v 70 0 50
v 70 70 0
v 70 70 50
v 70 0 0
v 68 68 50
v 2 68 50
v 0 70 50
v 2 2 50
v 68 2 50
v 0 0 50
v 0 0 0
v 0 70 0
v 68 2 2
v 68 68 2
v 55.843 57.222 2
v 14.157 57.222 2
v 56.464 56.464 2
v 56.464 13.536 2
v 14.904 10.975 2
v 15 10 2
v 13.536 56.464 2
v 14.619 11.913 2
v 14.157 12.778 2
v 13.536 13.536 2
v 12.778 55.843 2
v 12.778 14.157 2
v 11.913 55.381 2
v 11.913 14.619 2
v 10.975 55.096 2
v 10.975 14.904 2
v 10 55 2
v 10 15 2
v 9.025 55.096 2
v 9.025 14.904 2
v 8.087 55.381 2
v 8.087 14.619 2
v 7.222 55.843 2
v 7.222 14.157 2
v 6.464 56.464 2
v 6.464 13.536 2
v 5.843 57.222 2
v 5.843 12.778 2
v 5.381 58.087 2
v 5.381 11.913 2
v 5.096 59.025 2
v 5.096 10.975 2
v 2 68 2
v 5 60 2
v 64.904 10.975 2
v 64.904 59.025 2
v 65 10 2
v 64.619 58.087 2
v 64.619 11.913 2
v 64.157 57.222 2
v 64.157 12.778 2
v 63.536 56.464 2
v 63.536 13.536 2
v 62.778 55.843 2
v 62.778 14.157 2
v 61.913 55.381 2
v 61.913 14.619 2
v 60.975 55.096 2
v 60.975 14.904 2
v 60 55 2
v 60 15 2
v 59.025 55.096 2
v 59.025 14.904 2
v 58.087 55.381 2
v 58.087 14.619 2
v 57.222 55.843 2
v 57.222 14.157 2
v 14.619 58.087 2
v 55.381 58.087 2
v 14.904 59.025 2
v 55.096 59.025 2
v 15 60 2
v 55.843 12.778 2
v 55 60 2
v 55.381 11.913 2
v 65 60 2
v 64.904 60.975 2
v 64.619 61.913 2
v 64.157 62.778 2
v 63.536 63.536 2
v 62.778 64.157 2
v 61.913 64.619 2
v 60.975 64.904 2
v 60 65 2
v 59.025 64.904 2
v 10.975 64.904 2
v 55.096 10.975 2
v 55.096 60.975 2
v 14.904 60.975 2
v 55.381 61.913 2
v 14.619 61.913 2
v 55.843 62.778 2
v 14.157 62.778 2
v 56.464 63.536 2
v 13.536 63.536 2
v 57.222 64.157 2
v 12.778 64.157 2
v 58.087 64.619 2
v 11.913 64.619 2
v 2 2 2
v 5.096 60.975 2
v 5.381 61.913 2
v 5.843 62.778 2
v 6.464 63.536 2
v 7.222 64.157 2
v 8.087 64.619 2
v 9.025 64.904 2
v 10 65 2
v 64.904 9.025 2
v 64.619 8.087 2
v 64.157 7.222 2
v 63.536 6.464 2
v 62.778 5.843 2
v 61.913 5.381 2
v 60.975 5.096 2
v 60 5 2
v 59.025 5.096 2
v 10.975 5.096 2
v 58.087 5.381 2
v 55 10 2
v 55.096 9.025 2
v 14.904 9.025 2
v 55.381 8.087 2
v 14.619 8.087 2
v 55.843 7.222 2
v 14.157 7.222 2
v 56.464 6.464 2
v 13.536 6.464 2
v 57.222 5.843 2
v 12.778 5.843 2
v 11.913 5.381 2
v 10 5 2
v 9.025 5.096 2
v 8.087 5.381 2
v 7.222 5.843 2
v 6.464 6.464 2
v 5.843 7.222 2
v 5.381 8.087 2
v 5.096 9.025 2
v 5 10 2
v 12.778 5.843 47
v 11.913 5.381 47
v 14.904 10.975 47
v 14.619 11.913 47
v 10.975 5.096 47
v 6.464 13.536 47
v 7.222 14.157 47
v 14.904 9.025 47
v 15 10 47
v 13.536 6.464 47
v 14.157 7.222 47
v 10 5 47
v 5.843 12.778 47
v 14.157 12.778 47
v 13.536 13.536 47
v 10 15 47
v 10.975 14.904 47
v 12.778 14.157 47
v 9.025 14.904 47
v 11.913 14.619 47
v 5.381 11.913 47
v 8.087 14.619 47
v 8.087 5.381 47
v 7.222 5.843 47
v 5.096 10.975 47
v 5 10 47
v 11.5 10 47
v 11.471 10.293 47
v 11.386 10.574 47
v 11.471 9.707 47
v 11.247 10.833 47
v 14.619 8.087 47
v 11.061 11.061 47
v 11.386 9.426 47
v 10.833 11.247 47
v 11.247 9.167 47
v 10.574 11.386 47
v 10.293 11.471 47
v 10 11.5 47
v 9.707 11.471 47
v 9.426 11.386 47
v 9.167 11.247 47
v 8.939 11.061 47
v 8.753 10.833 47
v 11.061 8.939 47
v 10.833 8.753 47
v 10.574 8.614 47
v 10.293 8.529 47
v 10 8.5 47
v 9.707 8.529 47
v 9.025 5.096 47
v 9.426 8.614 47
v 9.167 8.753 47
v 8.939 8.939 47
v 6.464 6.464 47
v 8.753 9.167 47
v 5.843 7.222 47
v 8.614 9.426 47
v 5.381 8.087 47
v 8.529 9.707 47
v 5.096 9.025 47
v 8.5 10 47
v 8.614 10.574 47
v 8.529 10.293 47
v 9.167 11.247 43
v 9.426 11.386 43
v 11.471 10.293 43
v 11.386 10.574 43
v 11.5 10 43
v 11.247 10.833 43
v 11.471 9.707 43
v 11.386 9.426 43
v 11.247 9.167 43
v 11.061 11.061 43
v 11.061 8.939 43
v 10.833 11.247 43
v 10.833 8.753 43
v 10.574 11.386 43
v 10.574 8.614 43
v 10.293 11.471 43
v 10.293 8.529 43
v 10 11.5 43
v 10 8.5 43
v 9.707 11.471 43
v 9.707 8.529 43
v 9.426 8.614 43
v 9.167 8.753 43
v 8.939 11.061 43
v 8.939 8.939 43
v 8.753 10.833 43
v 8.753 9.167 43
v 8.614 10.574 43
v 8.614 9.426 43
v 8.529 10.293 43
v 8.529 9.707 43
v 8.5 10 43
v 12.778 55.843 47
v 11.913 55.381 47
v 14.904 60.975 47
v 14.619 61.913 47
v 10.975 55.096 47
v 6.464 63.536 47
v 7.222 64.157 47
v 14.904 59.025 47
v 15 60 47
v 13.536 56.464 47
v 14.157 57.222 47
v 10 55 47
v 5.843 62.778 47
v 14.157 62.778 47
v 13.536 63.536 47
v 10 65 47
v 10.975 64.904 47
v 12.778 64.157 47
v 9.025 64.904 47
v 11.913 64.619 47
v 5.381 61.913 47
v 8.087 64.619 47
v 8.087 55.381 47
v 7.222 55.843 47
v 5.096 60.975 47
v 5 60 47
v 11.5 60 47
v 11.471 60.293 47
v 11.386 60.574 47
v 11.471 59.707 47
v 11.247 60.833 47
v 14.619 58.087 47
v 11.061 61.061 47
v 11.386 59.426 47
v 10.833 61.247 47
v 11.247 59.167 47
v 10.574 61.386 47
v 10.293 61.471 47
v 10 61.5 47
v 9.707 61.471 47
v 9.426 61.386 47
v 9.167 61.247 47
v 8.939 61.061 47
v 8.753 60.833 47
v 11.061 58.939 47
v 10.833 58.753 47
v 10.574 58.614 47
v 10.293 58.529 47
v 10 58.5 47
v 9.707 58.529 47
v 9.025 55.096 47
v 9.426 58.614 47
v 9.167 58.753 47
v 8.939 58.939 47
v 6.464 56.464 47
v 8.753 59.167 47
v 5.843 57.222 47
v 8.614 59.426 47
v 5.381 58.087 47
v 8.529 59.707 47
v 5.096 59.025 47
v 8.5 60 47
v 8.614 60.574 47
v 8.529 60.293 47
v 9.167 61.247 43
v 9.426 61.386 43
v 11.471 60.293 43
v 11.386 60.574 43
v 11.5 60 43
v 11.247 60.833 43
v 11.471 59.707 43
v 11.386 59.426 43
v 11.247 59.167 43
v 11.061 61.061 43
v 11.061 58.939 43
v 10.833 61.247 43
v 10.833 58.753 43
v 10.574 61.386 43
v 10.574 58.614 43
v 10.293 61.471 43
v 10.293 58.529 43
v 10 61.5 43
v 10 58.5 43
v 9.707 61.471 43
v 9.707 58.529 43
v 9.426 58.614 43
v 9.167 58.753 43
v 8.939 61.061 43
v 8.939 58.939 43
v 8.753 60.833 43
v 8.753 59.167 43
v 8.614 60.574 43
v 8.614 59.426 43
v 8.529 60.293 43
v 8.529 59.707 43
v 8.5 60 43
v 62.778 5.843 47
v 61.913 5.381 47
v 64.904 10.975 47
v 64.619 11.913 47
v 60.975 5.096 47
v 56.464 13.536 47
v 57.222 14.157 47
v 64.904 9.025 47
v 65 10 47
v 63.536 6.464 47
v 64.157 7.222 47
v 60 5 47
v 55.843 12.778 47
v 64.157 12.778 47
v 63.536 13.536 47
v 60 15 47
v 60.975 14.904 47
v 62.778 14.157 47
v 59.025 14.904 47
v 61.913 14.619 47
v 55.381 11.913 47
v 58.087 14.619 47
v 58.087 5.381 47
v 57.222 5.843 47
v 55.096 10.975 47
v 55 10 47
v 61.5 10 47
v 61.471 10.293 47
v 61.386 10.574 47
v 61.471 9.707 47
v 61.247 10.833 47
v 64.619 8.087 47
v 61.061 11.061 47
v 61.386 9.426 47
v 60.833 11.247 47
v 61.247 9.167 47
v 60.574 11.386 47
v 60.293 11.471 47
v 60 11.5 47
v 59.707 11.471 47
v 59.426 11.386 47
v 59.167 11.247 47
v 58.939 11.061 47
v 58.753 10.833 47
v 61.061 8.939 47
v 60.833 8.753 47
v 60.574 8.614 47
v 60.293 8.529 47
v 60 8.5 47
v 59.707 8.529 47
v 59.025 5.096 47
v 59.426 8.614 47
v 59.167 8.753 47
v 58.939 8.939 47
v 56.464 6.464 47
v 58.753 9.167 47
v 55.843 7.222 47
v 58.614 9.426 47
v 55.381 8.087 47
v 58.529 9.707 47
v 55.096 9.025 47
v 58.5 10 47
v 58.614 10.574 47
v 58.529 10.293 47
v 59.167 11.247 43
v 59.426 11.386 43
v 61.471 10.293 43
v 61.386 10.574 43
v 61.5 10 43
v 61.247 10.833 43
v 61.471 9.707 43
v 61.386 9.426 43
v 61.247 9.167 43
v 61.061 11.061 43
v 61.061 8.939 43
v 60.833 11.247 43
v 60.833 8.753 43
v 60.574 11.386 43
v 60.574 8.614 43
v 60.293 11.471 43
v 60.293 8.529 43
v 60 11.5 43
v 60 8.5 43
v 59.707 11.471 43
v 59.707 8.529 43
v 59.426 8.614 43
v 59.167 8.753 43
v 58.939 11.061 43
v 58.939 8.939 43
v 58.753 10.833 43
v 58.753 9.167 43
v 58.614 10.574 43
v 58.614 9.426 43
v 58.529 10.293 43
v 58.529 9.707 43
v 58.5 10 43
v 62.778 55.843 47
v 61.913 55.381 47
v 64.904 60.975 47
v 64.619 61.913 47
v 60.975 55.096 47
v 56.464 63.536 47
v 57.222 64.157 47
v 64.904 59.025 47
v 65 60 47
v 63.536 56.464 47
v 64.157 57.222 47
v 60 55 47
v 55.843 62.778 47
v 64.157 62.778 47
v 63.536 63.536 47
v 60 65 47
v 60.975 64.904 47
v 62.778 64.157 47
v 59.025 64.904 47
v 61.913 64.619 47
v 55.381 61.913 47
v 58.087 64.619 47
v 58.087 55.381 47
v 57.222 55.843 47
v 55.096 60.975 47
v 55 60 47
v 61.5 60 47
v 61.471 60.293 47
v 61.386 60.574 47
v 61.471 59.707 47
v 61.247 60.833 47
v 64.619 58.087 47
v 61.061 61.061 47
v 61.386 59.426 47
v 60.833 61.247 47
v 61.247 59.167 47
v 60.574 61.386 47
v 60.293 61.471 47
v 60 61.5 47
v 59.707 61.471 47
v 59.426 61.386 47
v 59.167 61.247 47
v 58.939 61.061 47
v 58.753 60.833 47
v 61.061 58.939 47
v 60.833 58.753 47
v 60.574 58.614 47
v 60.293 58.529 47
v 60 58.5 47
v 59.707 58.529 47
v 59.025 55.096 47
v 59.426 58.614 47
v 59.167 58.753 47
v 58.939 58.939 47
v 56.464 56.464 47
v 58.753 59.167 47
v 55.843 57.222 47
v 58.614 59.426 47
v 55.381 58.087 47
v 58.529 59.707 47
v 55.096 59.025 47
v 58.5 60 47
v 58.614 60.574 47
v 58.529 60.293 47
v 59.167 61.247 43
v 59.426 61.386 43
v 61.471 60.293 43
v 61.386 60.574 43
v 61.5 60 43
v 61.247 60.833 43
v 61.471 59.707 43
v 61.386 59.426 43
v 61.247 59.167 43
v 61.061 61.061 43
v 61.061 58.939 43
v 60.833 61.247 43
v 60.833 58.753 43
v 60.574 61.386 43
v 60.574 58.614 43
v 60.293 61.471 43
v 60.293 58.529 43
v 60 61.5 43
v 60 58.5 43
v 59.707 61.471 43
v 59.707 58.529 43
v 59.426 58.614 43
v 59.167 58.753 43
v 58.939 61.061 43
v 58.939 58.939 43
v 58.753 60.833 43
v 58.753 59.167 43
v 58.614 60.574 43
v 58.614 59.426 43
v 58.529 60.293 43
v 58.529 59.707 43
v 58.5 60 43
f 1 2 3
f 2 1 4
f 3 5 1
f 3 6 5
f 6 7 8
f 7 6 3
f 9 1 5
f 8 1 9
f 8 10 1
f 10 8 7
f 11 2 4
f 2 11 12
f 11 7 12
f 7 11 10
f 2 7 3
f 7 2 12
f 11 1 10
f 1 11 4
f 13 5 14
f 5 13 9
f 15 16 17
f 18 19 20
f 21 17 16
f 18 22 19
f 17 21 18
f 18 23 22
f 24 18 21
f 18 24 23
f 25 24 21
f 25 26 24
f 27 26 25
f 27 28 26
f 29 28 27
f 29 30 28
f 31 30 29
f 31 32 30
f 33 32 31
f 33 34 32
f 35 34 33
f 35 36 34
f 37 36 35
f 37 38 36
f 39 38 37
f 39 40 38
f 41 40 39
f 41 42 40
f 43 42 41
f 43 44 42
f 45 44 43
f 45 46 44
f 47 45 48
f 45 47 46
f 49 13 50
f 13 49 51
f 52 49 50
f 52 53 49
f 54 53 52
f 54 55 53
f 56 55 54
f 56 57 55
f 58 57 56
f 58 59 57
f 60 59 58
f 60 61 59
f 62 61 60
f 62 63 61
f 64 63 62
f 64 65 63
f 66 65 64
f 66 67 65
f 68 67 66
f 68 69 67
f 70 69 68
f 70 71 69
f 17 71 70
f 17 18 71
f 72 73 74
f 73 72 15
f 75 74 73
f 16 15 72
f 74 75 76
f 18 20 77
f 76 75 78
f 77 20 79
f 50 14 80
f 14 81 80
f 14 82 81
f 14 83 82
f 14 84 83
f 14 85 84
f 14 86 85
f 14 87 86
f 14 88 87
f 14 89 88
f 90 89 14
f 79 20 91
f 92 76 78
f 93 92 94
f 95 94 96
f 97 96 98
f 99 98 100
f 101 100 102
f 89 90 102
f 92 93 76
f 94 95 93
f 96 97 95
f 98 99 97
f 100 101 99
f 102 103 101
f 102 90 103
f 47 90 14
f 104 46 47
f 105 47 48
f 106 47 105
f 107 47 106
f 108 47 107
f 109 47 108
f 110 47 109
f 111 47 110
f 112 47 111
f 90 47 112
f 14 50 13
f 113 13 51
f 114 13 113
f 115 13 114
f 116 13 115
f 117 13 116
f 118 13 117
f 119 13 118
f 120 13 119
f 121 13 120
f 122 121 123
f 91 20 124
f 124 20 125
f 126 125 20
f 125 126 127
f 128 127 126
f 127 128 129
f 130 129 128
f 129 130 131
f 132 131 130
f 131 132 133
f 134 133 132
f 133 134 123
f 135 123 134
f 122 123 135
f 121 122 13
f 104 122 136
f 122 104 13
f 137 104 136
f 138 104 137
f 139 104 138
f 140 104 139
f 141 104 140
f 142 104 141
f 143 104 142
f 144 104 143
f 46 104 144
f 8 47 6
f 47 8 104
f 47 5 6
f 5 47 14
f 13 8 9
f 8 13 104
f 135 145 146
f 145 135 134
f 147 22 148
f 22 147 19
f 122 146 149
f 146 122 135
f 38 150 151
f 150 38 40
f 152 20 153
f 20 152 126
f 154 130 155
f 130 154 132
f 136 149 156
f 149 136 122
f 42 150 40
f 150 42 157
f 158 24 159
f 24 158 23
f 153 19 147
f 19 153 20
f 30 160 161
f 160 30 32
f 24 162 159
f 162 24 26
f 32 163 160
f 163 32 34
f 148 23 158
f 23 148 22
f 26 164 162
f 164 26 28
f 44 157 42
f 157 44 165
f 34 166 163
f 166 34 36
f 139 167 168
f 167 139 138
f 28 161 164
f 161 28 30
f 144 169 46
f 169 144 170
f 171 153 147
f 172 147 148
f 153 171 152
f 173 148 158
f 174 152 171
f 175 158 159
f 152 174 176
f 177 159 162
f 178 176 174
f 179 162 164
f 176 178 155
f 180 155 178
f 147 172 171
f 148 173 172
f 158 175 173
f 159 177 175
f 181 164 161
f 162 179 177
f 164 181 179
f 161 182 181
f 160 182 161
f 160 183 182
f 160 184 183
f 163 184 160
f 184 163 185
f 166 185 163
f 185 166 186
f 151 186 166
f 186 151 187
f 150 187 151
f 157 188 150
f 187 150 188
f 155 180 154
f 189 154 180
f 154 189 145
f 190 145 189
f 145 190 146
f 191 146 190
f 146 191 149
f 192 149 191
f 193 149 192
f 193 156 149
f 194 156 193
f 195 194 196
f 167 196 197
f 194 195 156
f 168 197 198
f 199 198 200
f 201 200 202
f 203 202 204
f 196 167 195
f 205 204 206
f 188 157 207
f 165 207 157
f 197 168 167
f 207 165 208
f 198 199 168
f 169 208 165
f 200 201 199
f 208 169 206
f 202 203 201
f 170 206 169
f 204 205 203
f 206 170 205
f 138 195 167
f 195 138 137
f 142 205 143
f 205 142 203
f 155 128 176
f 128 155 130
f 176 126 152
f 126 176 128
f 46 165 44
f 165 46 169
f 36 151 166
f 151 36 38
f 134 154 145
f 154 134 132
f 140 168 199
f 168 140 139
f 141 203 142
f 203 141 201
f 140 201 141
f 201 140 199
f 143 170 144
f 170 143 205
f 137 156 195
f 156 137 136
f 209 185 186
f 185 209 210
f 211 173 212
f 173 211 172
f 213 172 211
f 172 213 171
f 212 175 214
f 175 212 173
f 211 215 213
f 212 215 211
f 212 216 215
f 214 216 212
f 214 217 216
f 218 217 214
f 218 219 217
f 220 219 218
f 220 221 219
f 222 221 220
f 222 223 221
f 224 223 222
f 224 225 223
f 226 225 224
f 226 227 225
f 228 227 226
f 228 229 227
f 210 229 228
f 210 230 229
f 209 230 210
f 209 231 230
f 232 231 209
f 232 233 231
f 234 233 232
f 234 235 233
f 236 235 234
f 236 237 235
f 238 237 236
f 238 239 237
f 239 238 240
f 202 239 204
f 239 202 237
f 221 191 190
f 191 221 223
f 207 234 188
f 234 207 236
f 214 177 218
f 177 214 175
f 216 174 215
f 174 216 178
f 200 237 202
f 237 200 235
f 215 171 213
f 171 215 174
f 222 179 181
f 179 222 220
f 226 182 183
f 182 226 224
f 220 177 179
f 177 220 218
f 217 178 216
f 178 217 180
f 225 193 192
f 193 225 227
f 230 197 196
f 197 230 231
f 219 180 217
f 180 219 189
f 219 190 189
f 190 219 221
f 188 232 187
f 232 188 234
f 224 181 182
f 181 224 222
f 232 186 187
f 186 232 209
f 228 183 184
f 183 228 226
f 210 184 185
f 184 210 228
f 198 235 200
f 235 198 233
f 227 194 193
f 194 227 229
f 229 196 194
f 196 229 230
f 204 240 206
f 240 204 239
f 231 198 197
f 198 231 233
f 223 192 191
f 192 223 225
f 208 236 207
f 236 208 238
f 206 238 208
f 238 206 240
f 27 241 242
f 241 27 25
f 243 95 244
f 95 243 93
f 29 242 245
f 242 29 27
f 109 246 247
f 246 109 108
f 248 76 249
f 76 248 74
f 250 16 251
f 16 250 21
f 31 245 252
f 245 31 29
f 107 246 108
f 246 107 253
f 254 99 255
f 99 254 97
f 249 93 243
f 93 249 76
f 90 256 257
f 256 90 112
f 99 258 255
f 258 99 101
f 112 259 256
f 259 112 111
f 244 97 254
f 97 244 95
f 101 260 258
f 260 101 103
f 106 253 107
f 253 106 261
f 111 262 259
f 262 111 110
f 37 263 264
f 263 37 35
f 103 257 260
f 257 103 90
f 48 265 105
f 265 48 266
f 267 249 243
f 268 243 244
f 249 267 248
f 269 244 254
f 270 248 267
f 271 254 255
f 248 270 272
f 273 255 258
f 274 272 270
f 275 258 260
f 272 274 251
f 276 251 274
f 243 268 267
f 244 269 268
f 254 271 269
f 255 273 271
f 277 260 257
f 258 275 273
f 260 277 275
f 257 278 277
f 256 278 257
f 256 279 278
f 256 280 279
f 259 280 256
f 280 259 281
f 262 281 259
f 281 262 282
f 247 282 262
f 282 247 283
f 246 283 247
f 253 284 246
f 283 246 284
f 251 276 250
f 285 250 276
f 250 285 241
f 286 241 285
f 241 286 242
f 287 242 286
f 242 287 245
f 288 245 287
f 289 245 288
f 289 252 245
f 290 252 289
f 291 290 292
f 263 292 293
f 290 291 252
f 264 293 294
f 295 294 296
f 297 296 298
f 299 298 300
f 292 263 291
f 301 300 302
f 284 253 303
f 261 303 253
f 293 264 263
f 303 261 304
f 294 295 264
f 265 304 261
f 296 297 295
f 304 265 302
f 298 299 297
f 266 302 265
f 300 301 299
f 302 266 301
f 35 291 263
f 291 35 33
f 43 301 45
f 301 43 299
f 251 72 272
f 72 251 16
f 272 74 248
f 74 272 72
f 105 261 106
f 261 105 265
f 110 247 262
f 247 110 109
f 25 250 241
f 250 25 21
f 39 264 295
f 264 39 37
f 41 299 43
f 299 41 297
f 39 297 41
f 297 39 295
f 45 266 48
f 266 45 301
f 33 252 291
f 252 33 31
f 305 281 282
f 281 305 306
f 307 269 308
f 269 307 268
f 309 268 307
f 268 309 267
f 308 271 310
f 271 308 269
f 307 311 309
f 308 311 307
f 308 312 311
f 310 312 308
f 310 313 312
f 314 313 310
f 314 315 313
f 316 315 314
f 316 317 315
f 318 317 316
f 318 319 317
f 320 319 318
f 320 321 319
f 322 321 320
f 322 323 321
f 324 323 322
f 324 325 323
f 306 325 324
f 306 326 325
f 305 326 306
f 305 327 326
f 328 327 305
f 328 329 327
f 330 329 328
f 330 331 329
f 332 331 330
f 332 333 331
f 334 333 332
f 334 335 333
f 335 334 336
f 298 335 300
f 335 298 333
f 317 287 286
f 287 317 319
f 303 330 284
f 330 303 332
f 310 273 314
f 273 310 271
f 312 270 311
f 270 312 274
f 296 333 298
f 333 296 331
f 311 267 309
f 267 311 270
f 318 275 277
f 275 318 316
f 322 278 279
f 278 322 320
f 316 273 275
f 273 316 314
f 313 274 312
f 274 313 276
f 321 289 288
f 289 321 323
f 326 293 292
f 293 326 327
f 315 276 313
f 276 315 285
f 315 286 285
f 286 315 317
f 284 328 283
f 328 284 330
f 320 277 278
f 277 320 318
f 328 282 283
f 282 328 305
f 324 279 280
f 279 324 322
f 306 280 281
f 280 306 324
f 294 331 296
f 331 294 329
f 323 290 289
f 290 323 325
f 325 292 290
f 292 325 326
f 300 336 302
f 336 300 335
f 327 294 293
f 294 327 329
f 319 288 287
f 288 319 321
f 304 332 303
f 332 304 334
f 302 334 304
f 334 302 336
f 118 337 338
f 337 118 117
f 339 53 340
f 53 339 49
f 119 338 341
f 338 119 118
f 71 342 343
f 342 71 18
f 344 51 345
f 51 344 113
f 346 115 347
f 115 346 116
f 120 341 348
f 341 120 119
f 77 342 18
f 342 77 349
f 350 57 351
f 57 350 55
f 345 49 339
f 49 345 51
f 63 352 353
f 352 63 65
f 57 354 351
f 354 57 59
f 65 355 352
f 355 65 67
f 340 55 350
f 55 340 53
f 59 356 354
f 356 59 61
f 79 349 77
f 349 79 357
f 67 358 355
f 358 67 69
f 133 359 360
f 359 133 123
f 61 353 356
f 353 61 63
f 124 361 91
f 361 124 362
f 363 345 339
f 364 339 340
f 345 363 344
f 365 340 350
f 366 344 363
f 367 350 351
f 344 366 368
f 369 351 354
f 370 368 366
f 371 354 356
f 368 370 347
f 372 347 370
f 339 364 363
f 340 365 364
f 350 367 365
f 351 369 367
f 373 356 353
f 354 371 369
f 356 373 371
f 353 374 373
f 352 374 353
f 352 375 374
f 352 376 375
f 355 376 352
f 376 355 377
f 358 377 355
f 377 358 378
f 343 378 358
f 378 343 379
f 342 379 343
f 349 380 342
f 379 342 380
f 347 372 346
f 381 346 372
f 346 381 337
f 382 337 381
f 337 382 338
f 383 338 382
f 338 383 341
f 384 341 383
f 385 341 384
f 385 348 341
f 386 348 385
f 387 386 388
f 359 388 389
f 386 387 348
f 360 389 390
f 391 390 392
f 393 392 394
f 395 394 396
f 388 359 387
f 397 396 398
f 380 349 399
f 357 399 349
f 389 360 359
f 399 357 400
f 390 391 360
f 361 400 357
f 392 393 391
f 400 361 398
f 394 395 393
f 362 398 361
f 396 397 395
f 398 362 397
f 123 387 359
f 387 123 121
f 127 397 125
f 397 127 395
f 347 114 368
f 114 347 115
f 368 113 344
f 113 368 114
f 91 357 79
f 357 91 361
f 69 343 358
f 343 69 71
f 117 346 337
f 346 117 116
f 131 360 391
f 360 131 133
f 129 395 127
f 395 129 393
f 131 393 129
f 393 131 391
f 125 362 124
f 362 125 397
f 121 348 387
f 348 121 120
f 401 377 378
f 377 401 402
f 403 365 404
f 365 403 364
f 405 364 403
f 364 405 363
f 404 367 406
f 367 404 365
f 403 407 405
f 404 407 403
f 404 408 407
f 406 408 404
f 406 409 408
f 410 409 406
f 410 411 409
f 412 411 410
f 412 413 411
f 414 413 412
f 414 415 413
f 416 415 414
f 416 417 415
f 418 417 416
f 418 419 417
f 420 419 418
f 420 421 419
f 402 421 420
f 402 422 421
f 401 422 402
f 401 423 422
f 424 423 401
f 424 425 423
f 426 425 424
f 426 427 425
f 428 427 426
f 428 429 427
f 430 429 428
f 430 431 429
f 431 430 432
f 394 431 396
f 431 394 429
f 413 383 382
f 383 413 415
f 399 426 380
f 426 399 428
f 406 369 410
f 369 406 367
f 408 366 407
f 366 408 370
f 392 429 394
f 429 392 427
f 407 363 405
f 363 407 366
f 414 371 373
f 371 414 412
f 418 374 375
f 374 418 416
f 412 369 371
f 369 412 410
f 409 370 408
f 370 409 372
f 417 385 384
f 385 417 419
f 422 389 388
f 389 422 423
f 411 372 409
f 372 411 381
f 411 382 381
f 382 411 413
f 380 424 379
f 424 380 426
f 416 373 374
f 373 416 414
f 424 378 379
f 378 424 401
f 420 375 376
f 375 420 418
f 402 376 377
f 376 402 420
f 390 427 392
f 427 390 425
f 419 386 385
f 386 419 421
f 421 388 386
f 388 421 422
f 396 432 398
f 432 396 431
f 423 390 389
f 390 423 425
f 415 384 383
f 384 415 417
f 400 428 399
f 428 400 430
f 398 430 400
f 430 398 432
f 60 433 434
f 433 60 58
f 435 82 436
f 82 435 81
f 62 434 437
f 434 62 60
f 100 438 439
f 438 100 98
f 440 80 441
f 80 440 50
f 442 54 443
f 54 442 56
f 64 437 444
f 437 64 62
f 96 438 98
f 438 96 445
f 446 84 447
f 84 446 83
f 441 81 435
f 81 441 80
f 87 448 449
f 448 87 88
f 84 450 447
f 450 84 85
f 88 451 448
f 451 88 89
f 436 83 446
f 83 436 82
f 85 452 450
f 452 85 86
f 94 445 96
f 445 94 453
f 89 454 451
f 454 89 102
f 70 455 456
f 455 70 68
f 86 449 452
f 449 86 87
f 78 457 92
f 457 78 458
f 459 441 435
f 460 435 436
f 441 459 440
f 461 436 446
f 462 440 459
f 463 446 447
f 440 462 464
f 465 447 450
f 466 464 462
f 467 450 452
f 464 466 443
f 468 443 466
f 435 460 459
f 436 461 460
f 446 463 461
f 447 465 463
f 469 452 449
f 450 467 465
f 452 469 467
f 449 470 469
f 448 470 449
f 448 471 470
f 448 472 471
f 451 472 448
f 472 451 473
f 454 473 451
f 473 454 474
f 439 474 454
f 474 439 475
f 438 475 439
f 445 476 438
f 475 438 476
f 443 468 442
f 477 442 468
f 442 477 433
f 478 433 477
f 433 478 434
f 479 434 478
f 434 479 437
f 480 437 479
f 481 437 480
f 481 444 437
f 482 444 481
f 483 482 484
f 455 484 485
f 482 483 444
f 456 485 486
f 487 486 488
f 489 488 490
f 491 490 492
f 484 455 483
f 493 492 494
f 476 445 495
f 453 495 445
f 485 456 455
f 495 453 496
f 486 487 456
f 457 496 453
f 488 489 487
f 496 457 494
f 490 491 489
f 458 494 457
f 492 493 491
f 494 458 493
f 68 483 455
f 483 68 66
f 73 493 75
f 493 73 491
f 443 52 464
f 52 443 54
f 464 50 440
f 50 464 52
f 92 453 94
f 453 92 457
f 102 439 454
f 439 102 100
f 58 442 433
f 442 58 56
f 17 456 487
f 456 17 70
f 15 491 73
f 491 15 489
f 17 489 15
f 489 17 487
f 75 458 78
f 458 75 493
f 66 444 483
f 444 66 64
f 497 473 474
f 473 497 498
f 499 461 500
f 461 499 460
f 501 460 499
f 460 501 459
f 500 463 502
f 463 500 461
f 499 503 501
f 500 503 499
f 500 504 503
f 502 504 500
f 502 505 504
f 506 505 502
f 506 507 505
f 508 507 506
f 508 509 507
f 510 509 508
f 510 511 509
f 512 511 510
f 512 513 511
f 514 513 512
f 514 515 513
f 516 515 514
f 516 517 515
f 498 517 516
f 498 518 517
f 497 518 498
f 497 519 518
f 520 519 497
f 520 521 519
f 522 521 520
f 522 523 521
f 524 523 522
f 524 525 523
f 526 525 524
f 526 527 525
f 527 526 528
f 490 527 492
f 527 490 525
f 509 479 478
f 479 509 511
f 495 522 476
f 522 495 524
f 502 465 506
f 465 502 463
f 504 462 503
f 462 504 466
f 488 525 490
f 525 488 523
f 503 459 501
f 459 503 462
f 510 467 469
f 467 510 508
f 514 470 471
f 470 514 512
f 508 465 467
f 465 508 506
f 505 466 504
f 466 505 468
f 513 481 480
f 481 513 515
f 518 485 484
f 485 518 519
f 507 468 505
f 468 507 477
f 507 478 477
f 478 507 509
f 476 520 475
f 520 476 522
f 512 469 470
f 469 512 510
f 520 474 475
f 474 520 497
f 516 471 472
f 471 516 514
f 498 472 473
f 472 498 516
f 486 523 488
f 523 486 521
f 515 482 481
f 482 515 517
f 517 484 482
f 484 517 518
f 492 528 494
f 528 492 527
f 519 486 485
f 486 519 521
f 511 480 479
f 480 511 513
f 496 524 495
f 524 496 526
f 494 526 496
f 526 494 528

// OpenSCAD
$fn = 32;

// ----------------------------------------------------------------------
// Enclosure box: bosses enclosure
// ----------------------------------------------------------------------

// --- parameters (mm) ---
box_l = 70;               // outer length, X
box_w = 70;               // outer width, Y
box_h = 50;               // outer height
wall_t = 2;               // wall thickness
boss_r = 5;               // corner boss radius
hole_r = 1.5;             // boss screw hole radius
boss_in = 10;             // boss inset from the corners
fit_tol = 0.1;            // tolerance for press fits, mm
free_tol = 0.5;           // tolerance for clearance fits, mm

inner_h = box_h - wall_t;  // cavity depth
boss_h = inner_h - 2;  // corner boss height

difference() {
  union() {
    difference() {
      cube([box_l, box_w, box_h]);
      translate([wall_t, wall_t, wall_t])
        cube([box_l - 2 * wall_t, box_w - 2 * wall_t, box_h]);
    }
    for (sx = [0, 1], sy = [0, 1])
      translate([sx ? box_l - boss_in : boss_in,
                 sy ? box_w - boss_in : boss_in, wall_t - 1])
        difference() {
          cylinder(r = boss_r, h = boss_h);
          translate([0, 0, boss_h - 4])
            cylinder(r = hole_r, h = 5);
        }
  }
}
